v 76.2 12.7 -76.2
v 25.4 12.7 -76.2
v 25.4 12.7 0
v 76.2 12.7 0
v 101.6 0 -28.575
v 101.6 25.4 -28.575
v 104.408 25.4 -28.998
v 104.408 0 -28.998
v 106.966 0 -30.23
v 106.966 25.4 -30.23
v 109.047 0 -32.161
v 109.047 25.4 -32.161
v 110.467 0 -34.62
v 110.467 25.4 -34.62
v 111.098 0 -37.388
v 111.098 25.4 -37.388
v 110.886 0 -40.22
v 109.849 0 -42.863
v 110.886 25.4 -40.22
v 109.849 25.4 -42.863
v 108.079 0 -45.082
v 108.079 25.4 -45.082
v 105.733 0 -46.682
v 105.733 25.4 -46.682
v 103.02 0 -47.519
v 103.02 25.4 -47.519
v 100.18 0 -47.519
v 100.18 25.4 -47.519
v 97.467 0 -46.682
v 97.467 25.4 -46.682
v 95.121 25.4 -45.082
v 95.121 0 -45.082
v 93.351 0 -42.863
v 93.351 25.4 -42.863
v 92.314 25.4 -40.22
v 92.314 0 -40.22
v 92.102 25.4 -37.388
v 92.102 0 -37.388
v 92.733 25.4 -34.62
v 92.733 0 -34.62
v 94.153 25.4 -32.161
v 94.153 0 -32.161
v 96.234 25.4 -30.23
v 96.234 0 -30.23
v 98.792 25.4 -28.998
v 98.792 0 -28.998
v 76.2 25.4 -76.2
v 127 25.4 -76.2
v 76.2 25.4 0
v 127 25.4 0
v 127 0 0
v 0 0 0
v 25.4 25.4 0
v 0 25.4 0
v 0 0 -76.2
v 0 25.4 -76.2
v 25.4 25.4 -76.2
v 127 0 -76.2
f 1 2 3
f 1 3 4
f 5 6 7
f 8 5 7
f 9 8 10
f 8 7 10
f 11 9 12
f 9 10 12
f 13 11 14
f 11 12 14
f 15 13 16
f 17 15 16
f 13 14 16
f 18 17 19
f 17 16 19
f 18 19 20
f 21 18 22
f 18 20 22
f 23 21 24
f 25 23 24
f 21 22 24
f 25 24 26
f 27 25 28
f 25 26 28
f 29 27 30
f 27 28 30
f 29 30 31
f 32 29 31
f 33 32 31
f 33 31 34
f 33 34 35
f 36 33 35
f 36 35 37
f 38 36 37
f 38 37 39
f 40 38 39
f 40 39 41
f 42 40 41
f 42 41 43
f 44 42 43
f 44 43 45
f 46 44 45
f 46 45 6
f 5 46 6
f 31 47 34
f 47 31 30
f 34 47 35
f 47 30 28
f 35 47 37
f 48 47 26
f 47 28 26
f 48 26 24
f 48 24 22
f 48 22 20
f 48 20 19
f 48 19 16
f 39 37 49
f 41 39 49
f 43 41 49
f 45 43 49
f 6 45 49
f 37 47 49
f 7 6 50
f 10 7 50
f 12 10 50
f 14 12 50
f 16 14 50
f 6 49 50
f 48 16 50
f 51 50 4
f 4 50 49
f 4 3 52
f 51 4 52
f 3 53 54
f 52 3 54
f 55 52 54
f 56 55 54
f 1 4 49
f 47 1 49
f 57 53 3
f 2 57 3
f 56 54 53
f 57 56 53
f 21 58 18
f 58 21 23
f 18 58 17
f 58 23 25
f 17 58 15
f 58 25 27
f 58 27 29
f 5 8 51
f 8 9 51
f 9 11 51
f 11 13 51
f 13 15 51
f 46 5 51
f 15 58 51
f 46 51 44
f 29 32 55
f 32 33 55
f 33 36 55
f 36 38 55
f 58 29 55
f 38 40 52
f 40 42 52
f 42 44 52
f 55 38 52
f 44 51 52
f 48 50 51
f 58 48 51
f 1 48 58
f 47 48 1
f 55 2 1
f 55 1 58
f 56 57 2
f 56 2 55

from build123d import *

# Parameters (mm, degrees)
BOSS_EXTRUDE1_DEPTH = 76.2
SKETCH3_R           = 9.525
CUT_EXTRUDE1_DEPTH  = 151.268426491


with BuildPart() as part:
    # Sketch2 → Boss-Extrude1 (new body)
    with BuildSketch(Plane.XY):
        Polygon((25.4, 25.4), (25.4, 12.7), (76.2, 12.7), (76.2, 25.4), (127, 25.4), (127, 0), (0, 0), (0, 25.4), align=None)
    extrude(amount=-BOSS_EXTRUDE1_DEPTH)

    # Sketch3 → Cut-Extrude1 (cut, through all)
    with BuildSketch(Plane(origin=(0, 25.4, 0), x_dir=(1, 0, 0), z_dir=(0, 1, 0))):
        with Locations(Location((101.6, 38.1, 0), (0, 0, 270))):
            Circle(SKETCH3_R)
    extrude(amount=-CUT_EXTRUDE1_DEPTH, mode=Mode.SUBTRACT)


solid = part.part
